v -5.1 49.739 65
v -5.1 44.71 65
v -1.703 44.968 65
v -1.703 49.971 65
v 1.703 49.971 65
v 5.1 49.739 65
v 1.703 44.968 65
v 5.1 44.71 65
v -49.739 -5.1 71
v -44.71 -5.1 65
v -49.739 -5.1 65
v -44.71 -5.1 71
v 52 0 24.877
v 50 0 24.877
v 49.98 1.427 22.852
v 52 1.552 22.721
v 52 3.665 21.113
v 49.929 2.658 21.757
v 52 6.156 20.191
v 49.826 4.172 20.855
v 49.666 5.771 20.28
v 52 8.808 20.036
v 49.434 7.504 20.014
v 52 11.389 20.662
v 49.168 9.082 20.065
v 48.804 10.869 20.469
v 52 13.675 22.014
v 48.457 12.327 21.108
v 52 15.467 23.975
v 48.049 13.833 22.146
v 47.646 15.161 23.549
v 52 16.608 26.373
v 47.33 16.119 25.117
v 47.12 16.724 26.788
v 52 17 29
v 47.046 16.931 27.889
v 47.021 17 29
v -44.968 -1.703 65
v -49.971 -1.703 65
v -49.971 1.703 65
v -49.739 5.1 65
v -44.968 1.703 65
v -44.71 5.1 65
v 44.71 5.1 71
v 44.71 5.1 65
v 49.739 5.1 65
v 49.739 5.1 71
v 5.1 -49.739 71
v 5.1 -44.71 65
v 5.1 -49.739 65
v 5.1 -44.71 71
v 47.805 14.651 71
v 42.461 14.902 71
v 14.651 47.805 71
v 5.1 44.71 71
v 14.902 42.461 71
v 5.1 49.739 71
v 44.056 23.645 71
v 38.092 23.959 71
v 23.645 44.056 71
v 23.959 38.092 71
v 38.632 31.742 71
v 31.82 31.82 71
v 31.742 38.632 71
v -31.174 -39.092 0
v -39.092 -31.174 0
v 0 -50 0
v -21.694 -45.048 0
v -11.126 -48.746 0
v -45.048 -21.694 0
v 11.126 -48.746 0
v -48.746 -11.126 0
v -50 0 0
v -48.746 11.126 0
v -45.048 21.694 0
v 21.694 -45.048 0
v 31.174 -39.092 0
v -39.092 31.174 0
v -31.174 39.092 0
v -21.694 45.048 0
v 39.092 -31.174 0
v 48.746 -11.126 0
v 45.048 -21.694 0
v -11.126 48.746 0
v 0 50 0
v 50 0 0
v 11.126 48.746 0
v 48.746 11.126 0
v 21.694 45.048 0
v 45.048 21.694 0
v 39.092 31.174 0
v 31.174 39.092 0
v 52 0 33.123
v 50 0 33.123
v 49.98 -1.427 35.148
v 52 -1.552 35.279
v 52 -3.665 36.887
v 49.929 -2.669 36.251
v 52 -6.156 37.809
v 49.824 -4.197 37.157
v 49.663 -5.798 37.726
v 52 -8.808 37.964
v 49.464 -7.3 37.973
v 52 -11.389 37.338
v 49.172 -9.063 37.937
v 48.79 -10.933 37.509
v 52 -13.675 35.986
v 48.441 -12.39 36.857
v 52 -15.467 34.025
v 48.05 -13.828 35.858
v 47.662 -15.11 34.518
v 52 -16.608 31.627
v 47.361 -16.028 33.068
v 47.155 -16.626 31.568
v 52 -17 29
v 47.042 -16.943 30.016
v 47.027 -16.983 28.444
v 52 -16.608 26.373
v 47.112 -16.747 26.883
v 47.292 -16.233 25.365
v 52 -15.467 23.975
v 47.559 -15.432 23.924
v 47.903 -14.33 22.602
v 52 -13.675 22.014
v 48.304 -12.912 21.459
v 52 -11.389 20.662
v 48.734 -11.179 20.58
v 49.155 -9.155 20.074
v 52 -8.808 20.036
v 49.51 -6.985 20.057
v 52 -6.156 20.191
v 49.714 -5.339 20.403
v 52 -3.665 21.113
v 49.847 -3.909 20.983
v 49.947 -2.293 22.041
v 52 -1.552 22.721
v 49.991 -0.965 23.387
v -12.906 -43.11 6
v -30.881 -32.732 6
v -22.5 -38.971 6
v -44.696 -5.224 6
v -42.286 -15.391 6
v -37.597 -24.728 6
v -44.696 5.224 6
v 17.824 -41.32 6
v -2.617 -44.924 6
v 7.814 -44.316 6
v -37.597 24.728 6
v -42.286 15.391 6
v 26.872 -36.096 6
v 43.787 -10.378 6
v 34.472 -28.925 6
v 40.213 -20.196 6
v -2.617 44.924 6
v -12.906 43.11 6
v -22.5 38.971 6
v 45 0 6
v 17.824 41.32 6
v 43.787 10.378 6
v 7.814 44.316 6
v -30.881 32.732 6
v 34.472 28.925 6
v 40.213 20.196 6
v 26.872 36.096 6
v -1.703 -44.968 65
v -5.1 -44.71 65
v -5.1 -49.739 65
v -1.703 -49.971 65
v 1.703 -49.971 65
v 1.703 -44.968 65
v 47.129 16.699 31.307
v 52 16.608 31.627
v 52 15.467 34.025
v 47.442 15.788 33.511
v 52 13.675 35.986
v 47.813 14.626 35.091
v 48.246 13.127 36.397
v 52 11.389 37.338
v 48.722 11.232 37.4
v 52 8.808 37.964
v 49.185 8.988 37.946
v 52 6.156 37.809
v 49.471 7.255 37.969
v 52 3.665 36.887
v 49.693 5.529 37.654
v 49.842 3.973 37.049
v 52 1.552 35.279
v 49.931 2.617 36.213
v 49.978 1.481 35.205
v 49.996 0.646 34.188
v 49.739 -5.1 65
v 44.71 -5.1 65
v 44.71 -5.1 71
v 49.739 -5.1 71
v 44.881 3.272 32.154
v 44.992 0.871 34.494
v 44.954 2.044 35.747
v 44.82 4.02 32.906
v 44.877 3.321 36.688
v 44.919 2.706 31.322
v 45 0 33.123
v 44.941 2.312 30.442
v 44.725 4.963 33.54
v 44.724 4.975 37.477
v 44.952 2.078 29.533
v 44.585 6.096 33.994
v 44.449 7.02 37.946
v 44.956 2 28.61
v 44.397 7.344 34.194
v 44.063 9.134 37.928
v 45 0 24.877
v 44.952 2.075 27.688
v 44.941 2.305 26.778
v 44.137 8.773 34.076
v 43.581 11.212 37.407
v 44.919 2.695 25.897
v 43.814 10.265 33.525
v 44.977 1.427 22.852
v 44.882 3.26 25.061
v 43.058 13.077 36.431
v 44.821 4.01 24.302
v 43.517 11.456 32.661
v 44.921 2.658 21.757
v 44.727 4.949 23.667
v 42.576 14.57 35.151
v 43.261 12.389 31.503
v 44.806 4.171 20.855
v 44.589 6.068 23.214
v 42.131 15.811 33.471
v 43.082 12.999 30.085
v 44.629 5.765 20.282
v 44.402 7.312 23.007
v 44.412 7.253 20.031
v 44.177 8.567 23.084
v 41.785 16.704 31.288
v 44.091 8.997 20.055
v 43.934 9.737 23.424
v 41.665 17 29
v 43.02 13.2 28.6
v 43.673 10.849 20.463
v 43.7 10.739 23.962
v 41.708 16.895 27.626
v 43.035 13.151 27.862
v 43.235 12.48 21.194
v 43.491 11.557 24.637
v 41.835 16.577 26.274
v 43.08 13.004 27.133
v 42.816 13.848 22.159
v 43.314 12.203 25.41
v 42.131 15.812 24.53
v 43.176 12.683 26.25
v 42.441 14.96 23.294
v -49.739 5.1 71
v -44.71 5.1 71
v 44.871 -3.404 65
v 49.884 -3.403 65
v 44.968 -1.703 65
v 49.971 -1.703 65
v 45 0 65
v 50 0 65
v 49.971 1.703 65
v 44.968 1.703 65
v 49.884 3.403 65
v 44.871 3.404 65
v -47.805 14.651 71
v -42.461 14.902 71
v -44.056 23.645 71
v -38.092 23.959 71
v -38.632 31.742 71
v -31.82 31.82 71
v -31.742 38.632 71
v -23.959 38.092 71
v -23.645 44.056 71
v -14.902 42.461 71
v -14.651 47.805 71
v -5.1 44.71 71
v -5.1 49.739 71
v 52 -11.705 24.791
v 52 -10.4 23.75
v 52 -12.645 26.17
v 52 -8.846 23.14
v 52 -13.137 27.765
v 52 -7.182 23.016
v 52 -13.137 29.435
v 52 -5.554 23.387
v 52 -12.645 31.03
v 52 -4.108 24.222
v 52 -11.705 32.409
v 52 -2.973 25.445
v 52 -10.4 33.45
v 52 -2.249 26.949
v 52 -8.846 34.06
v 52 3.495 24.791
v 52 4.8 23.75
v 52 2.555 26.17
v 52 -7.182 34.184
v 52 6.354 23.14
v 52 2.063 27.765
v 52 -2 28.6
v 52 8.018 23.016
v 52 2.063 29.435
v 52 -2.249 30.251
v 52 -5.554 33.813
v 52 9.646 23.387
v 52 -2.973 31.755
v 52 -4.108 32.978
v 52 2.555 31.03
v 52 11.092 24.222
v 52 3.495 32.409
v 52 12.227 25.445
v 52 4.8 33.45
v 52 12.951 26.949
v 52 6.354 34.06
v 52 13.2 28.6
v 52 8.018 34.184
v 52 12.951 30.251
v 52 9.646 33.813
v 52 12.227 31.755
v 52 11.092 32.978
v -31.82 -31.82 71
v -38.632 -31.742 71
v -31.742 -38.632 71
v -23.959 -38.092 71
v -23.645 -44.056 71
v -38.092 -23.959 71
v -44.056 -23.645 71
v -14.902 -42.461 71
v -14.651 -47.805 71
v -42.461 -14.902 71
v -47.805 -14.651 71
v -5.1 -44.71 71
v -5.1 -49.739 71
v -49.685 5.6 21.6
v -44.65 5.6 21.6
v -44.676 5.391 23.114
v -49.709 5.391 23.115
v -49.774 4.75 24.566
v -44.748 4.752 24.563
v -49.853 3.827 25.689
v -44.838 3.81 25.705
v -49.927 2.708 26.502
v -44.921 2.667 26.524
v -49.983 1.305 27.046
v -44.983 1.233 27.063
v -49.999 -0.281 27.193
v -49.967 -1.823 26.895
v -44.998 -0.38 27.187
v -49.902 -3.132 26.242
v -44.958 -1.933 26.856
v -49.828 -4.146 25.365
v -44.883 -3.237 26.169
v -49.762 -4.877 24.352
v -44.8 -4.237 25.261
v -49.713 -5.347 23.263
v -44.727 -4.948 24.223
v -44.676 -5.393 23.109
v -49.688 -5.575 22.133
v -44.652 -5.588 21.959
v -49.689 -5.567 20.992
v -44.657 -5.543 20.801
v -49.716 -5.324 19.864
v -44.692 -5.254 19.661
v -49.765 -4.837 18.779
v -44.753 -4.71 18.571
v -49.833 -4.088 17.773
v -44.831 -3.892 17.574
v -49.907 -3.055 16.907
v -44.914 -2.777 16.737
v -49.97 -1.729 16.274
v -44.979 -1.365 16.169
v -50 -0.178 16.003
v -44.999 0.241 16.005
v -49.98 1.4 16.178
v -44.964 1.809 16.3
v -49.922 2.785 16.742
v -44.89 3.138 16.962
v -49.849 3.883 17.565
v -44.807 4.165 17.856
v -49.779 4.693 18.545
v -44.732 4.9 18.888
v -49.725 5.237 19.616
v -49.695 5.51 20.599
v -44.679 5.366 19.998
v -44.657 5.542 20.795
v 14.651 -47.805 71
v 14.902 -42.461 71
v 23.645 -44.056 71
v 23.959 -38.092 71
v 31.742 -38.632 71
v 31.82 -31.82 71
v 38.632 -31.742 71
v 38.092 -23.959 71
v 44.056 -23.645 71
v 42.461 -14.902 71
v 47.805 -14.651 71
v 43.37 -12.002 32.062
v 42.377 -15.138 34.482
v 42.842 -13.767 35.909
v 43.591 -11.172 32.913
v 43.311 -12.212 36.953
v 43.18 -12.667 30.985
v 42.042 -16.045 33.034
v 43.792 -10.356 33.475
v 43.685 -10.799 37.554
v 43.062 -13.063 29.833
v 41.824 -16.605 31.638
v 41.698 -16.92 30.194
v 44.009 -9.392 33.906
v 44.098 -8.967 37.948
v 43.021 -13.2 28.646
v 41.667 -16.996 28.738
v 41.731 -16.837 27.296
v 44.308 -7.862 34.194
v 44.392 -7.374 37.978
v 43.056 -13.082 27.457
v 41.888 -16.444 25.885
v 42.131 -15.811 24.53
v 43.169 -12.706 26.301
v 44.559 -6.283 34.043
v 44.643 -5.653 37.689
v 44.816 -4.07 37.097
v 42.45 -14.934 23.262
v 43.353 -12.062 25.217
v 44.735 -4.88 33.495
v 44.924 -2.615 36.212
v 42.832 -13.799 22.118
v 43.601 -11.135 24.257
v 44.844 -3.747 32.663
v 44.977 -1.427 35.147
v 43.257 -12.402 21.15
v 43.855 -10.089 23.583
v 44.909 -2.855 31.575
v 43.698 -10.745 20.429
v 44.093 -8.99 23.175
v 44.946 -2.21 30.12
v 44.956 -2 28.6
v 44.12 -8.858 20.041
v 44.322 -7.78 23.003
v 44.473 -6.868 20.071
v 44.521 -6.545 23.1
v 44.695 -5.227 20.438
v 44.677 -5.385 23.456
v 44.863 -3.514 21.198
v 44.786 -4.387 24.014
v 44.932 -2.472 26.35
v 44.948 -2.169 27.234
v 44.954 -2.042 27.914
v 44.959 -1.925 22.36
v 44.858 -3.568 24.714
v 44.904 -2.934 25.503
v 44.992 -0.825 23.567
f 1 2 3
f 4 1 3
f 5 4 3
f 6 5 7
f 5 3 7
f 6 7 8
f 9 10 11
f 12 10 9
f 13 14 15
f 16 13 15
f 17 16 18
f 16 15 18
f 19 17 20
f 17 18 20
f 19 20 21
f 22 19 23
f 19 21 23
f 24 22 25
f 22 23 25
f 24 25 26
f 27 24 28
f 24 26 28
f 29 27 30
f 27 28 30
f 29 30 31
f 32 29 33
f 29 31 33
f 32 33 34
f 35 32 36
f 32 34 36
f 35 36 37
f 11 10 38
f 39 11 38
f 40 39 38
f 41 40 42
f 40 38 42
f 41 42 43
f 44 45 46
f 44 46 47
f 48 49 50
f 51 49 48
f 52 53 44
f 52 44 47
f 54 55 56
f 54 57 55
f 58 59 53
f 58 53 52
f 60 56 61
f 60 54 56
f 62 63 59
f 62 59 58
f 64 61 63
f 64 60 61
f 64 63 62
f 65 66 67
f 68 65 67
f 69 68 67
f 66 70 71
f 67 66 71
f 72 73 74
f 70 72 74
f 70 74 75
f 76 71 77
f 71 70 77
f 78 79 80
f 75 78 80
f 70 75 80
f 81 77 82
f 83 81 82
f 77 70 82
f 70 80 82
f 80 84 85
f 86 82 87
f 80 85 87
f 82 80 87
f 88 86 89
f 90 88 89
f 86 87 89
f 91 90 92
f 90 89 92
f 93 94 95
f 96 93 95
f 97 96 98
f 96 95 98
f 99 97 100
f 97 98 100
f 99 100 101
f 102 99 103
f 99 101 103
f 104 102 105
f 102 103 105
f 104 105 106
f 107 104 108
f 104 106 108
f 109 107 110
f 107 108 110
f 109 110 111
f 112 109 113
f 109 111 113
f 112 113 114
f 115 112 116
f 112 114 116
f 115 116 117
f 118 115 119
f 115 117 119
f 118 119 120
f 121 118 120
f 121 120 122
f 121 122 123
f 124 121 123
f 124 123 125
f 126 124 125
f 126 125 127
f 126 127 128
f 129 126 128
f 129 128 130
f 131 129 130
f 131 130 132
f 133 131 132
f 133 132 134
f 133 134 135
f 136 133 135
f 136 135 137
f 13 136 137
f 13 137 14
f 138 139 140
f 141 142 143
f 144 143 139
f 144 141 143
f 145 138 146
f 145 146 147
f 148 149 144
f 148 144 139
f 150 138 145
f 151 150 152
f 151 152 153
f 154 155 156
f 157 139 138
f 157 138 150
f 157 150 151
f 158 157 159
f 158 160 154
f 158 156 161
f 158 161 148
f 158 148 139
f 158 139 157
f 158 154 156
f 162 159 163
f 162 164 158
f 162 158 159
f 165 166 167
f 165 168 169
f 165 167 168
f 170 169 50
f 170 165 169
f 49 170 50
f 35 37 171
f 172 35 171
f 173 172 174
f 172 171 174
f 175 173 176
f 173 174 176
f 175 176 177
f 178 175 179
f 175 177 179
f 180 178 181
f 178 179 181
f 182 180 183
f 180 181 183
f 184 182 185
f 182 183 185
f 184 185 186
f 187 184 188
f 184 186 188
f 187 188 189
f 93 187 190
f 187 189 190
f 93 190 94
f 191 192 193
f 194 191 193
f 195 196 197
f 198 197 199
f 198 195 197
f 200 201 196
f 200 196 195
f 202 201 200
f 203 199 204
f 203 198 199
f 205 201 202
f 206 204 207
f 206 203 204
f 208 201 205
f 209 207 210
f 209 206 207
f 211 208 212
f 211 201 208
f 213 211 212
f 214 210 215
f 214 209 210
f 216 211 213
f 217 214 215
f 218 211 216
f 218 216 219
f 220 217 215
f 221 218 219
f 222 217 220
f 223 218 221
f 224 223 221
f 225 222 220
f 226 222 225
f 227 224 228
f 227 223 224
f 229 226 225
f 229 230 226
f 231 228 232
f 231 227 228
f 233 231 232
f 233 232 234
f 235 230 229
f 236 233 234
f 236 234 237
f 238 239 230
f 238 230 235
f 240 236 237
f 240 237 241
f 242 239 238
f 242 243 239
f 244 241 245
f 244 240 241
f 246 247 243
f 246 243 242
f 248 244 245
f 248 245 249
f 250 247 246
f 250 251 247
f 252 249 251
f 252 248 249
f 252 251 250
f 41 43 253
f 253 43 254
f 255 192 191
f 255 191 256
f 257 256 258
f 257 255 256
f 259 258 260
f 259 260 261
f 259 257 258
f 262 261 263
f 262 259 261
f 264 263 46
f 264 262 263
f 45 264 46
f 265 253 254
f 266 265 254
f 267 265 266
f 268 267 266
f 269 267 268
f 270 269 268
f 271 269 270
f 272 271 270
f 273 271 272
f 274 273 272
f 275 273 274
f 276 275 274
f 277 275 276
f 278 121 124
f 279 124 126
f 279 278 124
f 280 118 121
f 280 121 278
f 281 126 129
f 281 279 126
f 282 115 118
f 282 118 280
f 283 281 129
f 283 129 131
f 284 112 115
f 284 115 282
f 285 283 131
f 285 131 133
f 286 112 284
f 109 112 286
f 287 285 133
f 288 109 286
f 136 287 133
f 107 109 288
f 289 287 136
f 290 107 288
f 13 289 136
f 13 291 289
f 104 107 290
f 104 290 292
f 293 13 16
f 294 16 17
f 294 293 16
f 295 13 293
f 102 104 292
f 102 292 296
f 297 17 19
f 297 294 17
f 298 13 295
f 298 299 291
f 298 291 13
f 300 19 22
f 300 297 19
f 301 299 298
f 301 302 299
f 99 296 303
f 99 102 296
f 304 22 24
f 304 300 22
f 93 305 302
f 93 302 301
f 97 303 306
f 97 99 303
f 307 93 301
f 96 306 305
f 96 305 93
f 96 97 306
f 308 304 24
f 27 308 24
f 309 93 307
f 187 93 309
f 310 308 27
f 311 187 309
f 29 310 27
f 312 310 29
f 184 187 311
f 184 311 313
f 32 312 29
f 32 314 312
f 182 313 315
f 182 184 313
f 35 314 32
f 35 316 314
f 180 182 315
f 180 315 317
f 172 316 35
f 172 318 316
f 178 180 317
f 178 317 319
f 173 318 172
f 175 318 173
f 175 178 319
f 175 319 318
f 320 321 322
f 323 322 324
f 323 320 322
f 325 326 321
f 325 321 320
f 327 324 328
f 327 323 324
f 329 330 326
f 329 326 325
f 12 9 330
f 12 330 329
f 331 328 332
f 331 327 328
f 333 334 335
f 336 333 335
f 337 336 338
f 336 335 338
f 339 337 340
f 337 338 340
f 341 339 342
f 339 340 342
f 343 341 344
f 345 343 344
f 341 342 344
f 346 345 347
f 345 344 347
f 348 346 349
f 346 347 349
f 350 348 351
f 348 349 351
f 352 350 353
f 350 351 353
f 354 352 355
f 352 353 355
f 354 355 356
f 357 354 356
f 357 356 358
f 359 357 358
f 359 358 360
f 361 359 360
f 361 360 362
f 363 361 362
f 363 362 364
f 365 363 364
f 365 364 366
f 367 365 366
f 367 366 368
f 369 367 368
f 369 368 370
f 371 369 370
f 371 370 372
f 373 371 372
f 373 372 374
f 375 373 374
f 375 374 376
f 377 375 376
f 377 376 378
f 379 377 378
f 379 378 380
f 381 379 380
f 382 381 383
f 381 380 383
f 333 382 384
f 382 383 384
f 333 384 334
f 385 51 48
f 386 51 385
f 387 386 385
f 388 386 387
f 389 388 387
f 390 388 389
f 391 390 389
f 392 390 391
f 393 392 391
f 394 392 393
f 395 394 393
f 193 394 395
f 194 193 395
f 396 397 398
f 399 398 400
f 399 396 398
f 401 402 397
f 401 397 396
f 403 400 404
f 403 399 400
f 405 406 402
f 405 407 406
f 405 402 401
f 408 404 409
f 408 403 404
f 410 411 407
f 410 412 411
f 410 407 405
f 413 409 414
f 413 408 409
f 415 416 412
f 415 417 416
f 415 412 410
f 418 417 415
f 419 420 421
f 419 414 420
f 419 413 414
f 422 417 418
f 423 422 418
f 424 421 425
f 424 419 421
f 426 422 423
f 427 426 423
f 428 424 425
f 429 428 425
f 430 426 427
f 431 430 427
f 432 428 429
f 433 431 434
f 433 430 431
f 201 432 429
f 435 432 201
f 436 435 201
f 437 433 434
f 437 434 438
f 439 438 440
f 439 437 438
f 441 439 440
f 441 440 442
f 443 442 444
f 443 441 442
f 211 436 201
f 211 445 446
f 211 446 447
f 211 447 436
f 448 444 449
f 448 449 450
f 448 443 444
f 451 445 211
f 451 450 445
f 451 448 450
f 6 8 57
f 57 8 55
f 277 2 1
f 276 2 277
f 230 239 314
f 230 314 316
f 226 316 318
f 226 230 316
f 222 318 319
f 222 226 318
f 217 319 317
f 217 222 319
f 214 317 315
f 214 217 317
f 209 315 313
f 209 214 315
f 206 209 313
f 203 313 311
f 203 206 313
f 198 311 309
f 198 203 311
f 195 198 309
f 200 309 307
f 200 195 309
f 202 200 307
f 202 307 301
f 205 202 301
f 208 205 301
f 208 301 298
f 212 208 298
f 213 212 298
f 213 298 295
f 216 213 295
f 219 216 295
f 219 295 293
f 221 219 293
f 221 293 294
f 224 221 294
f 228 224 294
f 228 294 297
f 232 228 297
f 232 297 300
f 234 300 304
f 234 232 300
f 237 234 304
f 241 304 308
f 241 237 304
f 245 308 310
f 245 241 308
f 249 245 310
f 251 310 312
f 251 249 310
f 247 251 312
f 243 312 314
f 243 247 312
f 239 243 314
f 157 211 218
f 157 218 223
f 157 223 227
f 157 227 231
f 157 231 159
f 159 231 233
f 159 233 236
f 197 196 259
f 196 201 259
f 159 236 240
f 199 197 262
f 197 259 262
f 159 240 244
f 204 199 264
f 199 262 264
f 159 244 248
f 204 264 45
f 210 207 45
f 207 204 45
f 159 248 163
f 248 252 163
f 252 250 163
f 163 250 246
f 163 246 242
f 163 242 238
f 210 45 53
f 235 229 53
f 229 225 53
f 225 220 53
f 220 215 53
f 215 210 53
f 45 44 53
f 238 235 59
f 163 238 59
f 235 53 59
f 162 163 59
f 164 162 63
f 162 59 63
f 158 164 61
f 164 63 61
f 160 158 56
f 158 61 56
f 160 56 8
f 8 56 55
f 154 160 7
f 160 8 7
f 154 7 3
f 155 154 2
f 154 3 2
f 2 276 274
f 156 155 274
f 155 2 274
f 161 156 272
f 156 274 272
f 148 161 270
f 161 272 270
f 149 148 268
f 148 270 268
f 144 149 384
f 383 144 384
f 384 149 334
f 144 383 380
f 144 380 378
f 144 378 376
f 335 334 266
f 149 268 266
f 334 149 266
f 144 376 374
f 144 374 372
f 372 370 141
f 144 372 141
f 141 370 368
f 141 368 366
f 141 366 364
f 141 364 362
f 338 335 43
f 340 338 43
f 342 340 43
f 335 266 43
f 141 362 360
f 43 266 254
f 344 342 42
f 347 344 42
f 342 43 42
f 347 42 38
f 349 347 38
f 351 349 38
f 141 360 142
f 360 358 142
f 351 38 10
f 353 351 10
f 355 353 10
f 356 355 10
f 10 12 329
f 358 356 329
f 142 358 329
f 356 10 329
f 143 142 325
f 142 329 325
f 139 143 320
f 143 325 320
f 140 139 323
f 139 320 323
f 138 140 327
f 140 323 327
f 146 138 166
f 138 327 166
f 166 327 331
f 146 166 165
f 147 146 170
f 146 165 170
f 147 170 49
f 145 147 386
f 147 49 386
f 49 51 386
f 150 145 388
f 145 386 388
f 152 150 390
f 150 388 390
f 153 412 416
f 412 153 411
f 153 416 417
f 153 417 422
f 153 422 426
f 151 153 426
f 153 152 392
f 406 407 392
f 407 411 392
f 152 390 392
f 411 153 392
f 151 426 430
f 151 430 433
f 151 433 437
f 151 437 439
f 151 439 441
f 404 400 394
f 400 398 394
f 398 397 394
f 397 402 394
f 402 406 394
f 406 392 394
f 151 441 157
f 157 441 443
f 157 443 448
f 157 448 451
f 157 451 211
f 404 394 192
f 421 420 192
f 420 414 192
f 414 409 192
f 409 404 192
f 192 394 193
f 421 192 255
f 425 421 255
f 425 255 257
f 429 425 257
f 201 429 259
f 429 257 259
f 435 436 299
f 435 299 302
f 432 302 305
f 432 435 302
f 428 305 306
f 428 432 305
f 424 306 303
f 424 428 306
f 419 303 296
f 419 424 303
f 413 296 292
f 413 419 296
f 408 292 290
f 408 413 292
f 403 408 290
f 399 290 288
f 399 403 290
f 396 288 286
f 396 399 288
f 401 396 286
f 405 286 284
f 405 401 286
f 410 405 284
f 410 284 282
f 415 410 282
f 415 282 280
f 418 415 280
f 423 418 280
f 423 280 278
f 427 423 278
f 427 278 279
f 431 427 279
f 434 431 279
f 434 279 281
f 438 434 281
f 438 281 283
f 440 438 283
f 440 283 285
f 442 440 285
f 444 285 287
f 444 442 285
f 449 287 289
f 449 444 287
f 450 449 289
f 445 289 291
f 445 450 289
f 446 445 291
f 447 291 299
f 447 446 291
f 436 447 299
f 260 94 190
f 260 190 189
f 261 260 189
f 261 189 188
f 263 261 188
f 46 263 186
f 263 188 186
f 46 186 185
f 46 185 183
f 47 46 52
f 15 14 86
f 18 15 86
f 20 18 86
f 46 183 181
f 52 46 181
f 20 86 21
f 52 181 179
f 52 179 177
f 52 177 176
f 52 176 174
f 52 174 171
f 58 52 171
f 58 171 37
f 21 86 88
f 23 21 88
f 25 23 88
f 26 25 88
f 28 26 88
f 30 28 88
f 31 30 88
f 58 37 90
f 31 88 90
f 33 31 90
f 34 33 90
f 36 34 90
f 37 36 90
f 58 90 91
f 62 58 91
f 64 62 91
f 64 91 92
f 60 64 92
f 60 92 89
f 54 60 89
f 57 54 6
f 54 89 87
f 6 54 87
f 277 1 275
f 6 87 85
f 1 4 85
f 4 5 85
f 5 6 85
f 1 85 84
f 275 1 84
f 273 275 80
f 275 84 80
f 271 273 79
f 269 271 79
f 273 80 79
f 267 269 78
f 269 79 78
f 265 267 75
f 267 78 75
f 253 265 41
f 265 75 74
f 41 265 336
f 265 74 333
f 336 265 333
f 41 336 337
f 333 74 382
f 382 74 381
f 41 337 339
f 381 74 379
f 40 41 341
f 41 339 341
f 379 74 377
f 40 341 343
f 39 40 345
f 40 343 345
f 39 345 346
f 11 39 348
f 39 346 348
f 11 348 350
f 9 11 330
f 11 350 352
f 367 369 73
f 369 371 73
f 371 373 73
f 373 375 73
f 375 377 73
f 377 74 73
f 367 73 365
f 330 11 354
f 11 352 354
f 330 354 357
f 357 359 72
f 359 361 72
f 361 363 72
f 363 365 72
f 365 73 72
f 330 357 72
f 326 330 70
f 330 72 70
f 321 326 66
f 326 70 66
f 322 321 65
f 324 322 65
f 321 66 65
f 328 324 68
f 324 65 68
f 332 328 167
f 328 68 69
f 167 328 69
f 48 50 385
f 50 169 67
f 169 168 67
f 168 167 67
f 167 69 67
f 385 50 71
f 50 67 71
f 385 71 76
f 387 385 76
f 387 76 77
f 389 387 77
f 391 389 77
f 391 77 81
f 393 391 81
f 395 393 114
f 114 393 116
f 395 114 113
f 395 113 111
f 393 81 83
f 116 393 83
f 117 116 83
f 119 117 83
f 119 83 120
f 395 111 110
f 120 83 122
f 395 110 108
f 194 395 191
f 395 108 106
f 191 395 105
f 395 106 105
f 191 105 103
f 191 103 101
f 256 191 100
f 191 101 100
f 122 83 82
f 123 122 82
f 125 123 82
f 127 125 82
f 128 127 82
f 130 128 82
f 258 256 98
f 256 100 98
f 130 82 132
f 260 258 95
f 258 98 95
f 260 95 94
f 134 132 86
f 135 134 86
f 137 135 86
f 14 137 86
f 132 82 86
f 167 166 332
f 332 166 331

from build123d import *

# Parameters (mm, degrees)
F0_R      = 50
F1_DEPTH  = 71
F2_R      = 45
F3_DEPTH  = 65
F4_W      = 10.2
F4_H      = 6
F5_DEPTH  = 50
F6_W      = 10.2
F6_H      = 6
F7_DEPTH  = 50
F8_W      = 10.2
F8_H      = 6
F9_DEPTH  = 50
F10_W     = 10.2
F10_H     = 6
F11_DEPTH = 50
F12_R     = 5.6
F13_DEPTH = 55
F14_R     = 5.6
F15_DEPTH = 56
F17_DEPTH = 52
F18_DEPTH = 55
F19_R     = 45
F20_DEPTH = 50


with BuildPart() as f1:
    # F0 (on Top) → F1 (new body)
    with BuildSketch(Plane.XY):
        Circle(F0_R)
    extrude(amount=F1_DEPTH)

    # F2 (on face) → F3 (cut)
    with BuildSketch(Plane.XY.offset(71)):
        Circle(F2_R)
    extrude(amount=-F3_DEPTH, mode=Mode.SUBTRACT)

    # F4 (on Front) → F5 (cut)
    with BuildSketch(Plane.XZ):
        with Locations((0, 68)):
            Rectangle(F4_W, F4_H)
    extrude(amount=-F5_DEPTH, mode=Mode.SUBTRACT)

    # F6 (on Front) → F7 (cut)
    with BuildSketch(Plane.XZ):
        with Locations((0, 68)):
            Rectangle(F6_W, F6_H)
    extrude(amount=F7_DEPTH, mode=Mode.SUBTRACT)

    # F8 (on Right) → F9 (cut)
    with BuildSketch(Plane.YZ):
        with Locations((0, 68)):
            Rectangle(F8_W, F8_H)
    extrude(amount=-F9_DEPTH, mode=Mode.SUBTRACT)

    # F10 (on Right) → F11 (cut)
    with BuildSketch(Plane.YZ):
        with Locations((0, 68)):
            Rectangle(F10_W, F10_H)
    extrude(amount=F11_DEPTH, mode=Mode.SUBTRACT)

    # F12 (on Right) → F13 (cut)
    with BuildSketch(Plane.YZ):
        with Locations((0, 21.6)):
            Circle(F12_R)
    extrude(amount=-F13_DEPTH, mode=Mode.SUBTRACT)

    # F14 (on Right) → F15 (cut)
    with BuildSketch(Plane.YZ):
        with Locations((-7.6, 28.6)):
            Circle(F14_R)
        with Locations((7.6, 28.6)):
            Circle(F14_R)
    extrude(amount=F15_DEPTH, mode=Mode.SUBTRACT)

    # F16 (on Right) → F17 (join)
    with BuildSketch(Plane.YZ):
        with BuildLine():
            ThreePointArc((0, 24.8768943744), (0.7464278423, 26.8786796564), (1, 29))
            ThreePointArc((1, 29), (0.7464278423, 31.1213203436), (0, 33.1231056256))
            ThreePointArc((0, 33.1231056256), (-1, 29), (0, 24.8768943744))
        make_face()
        with BuildLine():
            ThreePointArc((0, 33.1231056256), (0.7464278423, 31.1213203436), (1, 29))
            ThreePointArc((1, 29), (0.7464278423, 26.8786796564), (0, 24.8768943744))
            ThreePointArc((0, 24.8768943744), (10.1213203436, 20.2535721577), (17, 29))
            ThreePointArc((17, 29), (10.1213203436, 37.7464278423), (0, 33.1231056256))
        make_face()
        with BuildLine():
            ThreePointArc((0, 24.8768943744), (-1, 29), (0, 33.1231056256))
            ThreePointArc((0, 33.1231056256), (-17, 29), (0, 24.8768943744))
        make_face()
    extrude(amount=F17_DEPTH)

    # F14 (on Right) → F18 (cut)
    with BuildSketch(Plane.YZ):
        with Locations((-7.6, 28.6)):
            Circle(F14_R)
        with Locations((7.6, 28.6)):
            Circle(F14_R)
    extrude(amount=F18_DEPTH, mode=Mode.SUBTRACT)

    # F19 (on face) → F20 (cut)
    with BuildSketch(Plane.XY.offset(6)):
        Circle(F19_R)
    extrude(amount=F20_DEPTH, mode=Mode.SUBTRACT)


solid = f1.part
